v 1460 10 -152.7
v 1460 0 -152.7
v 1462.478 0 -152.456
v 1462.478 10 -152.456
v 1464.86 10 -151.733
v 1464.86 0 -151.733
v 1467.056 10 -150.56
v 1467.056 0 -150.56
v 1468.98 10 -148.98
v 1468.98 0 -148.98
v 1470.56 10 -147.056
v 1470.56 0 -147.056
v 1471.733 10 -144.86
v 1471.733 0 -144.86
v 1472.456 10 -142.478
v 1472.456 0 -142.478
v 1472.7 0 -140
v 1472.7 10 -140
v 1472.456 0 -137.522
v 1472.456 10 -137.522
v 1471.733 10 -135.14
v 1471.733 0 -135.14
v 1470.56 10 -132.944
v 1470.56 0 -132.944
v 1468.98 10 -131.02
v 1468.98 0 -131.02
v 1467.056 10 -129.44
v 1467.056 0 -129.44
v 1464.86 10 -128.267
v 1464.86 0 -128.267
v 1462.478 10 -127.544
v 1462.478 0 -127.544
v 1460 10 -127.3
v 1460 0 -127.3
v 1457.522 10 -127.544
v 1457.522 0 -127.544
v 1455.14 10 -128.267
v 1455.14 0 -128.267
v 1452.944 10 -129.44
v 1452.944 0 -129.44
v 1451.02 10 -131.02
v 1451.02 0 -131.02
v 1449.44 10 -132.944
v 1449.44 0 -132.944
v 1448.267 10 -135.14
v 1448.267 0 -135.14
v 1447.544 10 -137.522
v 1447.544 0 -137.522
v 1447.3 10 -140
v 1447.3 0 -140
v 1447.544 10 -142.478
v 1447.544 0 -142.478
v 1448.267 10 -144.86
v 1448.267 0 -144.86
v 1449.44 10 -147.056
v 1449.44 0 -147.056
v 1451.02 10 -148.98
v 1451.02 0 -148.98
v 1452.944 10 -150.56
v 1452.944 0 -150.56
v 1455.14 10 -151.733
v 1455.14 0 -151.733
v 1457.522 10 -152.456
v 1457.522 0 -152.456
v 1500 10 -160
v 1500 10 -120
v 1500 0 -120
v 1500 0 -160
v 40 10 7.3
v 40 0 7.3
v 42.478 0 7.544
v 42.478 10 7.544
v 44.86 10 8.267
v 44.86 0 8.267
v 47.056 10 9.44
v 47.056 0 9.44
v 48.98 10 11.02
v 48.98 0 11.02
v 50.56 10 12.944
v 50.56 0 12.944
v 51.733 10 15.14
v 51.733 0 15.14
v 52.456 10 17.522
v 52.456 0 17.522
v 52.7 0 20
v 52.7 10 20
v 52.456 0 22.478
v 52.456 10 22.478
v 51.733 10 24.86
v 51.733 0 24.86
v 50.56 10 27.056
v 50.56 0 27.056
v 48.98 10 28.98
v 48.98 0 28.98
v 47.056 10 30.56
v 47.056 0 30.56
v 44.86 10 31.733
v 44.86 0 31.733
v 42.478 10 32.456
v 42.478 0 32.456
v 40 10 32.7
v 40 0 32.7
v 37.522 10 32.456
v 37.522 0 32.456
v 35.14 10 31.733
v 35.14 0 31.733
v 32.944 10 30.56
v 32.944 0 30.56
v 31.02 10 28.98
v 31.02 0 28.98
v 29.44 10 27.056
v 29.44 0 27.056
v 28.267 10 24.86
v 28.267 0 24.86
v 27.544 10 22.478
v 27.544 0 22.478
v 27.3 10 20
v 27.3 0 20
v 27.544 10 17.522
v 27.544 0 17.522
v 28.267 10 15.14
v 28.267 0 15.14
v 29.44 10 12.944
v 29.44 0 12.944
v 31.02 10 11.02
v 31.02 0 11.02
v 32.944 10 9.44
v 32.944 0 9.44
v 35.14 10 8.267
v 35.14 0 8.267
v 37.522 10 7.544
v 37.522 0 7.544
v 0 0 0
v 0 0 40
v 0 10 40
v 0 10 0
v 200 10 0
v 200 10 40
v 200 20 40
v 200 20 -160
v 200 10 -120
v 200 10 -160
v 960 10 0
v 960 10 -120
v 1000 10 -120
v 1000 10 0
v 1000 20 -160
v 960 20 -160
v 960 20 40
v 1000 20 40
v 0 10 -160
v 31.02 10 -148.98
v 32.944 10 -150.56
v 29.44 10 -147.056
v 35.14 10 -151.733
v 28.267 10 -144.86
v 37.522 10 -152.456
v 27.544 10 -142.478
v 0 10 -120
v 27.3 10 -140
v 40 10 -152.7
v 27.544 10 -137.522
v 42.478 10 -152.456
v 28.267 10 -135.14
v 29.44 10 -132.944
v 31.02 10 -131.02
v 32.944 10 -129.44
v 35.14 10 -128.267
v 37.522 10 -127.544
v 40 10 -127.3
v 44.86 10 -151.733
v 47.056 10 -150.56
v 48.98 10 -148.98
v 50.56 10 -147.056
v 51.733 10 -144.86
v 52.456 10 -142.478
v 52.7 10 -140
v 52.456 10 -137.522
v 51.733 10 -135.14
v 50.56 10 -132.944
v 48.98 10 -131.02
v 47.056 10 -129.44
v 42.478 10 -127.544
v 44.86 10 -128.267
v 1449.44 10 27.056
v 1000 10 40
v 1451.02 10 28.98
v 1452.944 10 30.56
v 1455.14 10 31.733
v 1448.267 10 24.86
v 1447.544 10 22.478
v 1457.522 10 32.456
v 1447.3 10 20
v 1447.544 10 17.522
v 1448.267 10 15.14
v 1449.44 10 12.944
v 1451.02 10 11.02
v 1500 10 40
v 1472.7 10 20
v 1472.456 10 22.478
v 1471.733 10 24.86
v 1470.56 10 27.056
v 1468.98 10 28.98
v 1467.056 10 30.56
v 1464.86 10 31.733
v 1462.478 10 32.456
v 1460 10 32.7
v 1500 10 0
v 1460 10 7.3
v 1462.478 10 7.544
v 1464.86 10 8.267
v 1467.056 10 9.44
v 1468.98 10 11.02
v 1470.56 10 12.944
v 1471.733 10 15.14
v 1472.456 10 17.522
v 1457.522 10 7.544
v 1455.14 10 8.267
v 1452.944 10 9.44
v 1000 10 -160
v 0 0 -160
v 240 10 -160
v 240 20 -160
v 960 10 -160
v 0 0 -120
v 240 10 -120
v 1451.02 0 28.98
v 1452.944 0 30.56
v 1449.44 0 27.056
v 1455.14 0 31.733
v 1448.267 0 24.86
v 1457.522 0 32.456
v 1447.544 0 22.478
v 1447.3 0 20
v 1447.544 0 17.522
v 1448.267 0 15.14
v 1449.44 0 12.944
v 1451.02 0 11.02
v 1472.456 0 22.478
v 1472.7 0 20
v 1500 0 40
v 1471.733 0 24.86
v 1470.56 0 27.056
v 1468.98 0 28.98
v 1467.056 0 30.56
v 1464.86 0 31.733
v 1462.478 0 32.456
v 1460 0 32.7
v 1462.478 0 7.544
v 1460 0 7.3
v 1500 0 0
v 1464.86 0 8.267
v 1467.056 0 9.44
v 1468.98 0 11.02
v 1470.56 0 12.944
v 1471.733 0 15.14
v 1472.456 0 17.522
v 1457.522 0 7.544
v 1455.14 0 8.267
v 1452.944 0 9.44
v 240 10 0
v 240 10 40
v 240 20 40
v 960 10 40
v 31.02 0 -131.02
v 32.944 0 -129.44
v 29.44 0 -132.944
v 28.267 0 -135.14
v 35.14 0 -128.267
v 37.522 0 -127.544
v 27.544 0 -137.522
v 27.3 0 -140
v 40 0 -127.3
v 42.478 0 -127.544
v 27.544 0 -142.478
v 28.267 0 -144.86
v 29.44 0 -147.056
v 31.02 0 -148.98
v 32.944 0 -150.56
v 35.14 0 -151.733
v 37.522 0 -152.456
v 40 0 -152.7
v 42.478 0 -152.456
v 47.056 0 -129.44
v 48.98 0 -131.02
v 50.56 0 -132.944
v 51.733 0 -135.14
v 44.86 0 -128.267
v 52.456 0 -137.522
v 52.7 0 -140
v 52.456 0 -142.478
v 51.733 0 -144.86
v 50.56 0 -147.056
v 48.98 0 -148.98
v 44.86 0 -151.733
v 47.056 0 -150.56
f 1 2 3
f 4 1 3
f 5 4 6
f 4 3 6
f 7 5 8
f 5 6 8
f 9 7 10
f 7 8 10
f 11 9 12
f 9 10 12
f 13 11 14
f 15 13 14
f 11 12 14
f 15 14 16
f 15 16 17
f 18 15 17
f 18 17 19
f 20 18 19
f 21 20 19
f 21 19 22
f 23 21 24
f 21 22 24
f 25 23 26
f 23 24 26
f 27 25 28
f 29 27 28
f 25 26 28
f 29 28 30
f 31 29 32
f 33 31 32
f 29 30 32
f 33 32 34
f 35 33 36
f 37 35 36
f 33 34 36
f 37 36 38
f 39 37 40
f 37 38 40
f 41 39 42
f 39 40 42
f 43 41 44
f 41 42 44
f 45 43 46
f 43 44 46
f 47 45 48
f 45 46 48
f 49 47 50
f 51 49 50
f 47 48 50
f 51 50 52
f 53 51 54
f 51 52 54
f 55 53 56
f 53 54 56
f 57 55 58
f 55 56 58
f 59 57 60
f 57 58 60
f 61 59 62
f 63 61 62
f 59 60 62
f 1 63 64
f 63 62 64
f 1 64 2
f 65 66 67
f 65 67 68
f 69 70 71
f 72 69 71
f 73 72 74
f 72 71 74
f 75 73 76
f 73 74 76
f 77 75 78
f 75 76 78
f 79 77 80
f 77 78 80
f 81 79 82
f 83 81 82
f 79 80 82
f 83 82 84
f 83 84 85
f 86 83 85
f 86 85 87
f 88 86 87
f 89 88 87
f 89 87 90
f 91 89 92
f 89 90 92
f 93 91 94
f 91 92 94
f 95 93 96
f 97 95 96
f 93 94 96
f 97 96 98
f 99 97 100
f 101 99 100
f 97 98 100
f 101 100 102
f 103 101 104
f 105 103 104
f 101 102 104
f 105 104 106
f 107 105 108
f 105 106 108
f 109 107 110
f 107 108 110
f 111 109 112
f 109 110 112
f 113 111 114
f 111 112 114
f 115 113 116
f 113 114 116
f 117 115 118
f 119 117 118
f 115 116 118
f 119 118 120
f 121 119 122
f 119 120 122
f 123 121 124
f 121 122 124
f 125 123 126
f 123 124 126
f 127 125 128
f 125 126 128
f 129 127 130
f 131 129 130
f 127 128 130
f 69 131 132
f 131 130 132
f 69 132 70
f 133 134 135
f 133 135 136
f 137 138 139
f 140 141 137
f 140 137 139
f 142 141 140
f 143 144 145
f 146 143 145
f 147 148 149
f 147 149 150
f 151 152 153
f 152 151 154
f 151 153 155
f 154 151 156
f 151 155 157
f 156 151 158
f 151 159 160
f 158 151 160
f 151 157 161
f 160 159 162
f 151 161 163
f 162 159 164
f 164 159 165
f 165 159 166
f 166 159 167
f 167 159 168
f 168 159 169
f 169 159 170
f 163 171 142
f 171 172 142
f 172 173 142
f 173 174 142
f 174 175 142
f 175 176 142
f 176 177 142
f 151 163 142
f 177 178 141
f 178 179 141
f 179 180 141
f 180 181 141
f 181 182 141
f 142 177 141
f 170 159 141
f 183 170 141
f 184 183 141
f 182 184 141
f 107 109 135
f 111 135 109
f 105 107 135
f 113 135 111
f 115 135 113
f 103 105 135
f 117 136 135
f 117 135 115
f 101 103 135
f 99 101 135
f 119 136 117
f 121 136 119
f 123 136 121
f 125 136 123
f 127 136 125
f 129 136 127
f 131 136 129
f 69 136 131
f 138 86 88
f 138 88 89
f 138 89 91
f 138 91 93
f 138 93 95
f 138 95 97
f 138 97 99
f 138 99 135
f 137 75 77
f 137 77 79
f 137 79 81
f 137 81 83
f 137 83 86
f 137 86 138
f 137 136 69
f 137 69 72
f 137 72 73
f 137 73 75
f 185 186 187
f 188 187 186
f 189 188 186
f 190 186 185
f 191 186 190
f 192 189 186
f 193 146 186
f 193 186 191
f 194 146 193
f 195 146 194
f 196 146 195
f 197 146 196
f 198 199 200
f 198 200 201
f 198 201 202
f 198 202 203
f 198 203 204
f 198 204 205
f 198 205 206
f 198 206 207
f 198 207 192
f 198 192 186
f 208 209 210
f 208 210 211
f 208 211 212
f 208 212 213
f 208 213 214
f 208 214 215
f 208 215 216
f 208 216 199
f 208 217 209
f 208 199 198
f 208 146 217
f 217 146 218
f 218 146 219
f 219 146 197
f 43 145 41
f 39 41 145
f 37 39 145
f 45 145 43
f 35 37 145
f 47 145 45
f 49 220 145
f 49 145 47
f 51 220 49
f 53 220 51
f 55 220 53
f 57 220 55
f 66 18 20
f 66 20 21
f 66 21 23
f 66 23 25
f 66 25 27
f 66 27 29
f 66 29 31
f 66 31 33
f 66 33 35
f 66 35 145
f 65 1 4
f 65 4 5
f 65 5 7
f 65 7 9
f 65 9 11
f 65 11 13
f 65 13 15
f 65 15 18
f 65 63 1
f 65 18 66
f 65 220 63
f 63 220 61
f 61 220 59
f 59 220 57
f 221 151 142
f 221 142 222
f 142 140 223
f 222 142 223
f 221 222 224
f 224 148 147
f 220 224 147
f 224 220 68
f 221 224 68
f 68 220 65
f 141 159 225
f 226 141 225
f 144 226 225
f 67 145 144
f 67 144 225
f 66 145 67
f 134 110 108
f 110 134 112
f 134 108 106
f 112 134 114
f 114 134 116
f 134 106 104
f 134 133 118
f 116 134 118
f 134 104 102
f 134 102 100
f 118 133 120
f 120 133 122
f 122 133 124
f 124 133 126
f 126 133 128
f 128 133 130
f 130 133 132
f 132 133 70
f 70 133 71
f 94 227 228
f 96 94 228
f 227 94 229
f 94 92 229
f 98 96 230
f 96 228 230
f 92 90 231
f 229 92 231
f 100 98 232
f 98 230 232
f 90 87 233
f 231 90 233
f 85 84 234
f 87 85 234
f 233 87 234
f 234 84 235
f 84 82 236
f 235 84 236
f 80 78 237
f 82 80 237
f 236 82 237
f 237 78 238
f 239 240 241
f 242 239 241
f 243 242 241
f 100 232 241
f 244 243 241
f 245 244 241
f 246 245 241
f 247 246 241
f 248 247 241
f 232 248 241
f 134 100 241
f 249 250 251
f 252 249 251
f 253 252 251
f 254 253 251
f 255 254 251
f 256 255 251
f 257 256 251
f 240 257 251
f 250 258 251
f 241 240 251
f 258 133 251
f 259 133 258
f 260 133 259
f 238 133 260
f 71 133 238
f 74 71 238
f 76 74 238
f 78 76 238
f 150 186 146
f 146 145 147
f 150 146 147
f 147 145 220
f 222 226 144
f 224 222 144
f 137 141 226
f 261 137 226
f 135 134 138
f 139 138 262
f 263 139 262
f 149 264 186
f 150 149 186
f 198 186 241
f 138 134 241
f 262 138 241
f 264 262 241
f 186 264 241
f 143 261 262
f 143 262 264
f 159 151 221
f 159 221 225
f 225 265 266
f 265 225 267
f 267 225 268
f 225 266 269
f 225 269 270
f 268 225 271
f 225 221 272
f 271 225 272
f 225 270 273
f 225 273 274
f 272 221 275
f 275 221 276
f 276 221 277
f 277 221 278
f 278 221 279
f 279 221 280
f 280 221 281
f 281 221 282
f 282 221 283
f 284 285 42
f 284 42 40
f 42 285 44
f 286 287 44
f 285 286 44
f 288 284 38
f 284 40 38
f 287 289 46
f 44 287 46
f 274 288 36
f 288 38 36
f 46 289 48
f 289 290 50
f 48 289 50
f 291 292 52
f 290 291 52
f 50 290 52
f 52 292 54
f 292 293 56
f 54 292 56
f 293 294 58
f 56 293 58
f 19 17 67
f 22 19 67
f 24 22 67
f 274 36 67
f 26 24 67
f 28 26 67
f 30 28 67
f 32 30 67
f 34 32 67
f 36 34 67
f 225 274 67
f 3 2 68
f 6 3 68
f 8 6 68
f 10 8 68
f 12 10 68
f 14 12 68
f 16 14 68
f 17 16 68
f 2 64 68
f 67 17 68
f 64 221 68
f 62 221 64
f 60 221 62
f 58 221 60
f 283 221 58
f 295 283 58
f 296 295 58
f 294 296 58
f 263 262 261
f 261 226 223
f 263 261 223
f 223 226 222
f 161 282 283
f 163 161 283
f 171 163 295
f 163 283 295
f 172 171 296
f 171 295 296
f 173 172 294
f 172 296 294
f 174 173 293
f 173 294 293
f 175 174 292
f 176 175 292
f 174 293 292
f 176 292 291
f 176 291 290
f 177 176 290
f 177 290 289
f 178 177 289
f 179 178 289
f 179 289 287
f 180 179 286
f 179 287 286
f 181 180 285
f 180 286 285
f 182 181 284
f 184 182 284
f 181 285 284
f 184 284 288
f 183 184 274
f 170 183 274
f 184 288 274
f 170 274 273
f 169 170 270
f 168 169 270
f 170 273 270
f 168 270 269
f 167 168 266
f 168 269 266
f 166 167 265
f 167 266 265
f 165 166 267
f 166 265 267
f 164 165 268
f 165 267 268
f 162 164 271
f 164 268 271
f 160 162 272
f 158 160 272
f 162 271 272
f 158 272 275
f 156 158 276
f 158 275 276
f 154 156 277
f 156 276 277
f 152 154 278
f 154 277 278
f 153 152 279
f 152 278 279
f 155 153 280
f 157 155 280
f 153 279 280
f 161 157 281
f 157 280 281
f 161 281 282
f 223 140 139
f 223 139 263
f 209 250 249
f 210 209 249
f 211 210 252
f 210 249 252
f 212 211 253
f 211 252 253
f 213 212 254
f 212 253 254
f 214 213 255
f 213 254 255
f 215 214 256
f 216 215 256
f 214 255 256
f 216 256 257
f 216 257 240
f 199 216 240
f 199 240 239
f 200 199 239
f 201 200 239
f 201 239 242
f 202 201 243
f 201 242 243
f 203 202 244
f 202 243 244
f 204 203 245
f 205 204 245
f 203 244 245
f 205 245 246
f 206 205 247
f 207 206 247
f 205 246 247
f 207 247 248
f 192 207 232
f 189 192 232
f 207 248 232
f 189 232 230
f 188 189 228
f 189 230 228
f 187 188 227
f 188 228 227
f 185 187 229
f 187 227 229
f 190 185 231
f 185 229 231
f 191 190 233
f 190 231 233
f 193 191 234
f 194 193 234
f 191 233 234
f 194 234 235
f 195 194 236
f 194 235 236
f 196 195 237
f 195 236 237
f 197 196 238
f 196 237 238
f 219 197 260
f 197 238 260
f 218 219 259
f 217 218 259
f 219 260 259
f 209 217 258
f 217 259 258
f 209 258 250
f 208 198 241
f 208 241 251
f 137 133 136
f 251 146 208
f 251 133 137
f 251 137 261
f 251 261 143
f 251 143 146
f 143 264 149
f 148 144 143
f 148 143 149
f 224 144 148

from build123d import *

# Parameters (mm, degrees)
SKETCH1_W           = 1200
SKETCH1_H           = 40
BOSS_EXTRUDE1_DEPTH = 10
SKETCH2_W           = 40
SKETCH2_H           = 200
BOSS_EXTRUDE2_DEPTH = 10
SKETCH3_W           = 1200
SKETCH3_H           = 40
BOSS_EXTRUDE3_DEPTH = 10
SKETCH5_W           = 300
SKETCH5_H           = 40
BOSS_EXTRUDE4_DEPTH = 10
SKETCH4_R           = 12.7
CUT_EXTRUDE1_DEPTH  = 10


with BuildPart() as part:
    # Sketch1 → Boss-Extrude1 (new body)
    with BuildSketch(Plane(origin=(0, 0, 0), x_dir=(1, 0, 0), z_dir=(0, 1, 0))):
        with Locations((600, -20)):
            Rectangle(SKETCH1_W, SKETCH1_H)
    extrude(amount=BOSS_EXTRUDE1_DEPTH)

    # Sketch2 → Boss-Extrude2 (add)
    with BuildSketch(Plane(origin=(0, 10, 0), x_dir=(1, 0, 0), z_dir=(0, 1, 0))):
        with Locations((220, 60)):
            Rectangle(SKETCH2_W, SKETCH2_H)
        with Locations((980, 60)):
            Rectangle(SKETCH2_W, SKETCH2_H)
    extrude(amount=BOSS_EXTRUDE2_DEPTH)

    # Sketch3 → Boss-Extrude3 (add)
    with BuildSketch(Plane.XZ.offset(-10)):
        with Locations((600, -140)):
            Rectangle(SKETCH3_W, SKETCH3_H)
    extrude(amount=BOSS_EXTRUDE3_DEPTH)

    # Sketch5 → Boss-Extrude4 (add)
    with BuildSketch(Plane(origin=(0, 10, 0), x_dir=(1, 0, 0), z_dir=(0, 1, 0))):
        with Locations((1350, 140)):
            Rectangle(SKETCH5_W, SKETCH5_H)
        with Locations((1350, -20)):
            Rectangle(SKETCH5_W, SKETCH5_H)
    extrude(amount=-BOSS_EXTRUDE4_DEPTH)

    # Sketch4 → Cut-Extrude1 (cut)
    with BuildSketch(Plane.XZ):
        with Locations(Location((1460, 20, 0), (0, 0, 270))):
            Circle(SKETCH4_R)
        with Locations(Location((40, 20, 0), (0, 0, 270))):
            Circle(SKETCH4_R)
        with Locations(Location((40, -140, 0), (0, 0, 270))):
            Circle(SKETCH4_R)
        with Locations(Location((1460, -140, 0), (0, 0, 270))):
            Circle(SKETCH4_R)
    extrude(amount=-CUT_EXTRUDE1_DEPTH, mode=Mode.SUBTRACT)


solid = part.part
